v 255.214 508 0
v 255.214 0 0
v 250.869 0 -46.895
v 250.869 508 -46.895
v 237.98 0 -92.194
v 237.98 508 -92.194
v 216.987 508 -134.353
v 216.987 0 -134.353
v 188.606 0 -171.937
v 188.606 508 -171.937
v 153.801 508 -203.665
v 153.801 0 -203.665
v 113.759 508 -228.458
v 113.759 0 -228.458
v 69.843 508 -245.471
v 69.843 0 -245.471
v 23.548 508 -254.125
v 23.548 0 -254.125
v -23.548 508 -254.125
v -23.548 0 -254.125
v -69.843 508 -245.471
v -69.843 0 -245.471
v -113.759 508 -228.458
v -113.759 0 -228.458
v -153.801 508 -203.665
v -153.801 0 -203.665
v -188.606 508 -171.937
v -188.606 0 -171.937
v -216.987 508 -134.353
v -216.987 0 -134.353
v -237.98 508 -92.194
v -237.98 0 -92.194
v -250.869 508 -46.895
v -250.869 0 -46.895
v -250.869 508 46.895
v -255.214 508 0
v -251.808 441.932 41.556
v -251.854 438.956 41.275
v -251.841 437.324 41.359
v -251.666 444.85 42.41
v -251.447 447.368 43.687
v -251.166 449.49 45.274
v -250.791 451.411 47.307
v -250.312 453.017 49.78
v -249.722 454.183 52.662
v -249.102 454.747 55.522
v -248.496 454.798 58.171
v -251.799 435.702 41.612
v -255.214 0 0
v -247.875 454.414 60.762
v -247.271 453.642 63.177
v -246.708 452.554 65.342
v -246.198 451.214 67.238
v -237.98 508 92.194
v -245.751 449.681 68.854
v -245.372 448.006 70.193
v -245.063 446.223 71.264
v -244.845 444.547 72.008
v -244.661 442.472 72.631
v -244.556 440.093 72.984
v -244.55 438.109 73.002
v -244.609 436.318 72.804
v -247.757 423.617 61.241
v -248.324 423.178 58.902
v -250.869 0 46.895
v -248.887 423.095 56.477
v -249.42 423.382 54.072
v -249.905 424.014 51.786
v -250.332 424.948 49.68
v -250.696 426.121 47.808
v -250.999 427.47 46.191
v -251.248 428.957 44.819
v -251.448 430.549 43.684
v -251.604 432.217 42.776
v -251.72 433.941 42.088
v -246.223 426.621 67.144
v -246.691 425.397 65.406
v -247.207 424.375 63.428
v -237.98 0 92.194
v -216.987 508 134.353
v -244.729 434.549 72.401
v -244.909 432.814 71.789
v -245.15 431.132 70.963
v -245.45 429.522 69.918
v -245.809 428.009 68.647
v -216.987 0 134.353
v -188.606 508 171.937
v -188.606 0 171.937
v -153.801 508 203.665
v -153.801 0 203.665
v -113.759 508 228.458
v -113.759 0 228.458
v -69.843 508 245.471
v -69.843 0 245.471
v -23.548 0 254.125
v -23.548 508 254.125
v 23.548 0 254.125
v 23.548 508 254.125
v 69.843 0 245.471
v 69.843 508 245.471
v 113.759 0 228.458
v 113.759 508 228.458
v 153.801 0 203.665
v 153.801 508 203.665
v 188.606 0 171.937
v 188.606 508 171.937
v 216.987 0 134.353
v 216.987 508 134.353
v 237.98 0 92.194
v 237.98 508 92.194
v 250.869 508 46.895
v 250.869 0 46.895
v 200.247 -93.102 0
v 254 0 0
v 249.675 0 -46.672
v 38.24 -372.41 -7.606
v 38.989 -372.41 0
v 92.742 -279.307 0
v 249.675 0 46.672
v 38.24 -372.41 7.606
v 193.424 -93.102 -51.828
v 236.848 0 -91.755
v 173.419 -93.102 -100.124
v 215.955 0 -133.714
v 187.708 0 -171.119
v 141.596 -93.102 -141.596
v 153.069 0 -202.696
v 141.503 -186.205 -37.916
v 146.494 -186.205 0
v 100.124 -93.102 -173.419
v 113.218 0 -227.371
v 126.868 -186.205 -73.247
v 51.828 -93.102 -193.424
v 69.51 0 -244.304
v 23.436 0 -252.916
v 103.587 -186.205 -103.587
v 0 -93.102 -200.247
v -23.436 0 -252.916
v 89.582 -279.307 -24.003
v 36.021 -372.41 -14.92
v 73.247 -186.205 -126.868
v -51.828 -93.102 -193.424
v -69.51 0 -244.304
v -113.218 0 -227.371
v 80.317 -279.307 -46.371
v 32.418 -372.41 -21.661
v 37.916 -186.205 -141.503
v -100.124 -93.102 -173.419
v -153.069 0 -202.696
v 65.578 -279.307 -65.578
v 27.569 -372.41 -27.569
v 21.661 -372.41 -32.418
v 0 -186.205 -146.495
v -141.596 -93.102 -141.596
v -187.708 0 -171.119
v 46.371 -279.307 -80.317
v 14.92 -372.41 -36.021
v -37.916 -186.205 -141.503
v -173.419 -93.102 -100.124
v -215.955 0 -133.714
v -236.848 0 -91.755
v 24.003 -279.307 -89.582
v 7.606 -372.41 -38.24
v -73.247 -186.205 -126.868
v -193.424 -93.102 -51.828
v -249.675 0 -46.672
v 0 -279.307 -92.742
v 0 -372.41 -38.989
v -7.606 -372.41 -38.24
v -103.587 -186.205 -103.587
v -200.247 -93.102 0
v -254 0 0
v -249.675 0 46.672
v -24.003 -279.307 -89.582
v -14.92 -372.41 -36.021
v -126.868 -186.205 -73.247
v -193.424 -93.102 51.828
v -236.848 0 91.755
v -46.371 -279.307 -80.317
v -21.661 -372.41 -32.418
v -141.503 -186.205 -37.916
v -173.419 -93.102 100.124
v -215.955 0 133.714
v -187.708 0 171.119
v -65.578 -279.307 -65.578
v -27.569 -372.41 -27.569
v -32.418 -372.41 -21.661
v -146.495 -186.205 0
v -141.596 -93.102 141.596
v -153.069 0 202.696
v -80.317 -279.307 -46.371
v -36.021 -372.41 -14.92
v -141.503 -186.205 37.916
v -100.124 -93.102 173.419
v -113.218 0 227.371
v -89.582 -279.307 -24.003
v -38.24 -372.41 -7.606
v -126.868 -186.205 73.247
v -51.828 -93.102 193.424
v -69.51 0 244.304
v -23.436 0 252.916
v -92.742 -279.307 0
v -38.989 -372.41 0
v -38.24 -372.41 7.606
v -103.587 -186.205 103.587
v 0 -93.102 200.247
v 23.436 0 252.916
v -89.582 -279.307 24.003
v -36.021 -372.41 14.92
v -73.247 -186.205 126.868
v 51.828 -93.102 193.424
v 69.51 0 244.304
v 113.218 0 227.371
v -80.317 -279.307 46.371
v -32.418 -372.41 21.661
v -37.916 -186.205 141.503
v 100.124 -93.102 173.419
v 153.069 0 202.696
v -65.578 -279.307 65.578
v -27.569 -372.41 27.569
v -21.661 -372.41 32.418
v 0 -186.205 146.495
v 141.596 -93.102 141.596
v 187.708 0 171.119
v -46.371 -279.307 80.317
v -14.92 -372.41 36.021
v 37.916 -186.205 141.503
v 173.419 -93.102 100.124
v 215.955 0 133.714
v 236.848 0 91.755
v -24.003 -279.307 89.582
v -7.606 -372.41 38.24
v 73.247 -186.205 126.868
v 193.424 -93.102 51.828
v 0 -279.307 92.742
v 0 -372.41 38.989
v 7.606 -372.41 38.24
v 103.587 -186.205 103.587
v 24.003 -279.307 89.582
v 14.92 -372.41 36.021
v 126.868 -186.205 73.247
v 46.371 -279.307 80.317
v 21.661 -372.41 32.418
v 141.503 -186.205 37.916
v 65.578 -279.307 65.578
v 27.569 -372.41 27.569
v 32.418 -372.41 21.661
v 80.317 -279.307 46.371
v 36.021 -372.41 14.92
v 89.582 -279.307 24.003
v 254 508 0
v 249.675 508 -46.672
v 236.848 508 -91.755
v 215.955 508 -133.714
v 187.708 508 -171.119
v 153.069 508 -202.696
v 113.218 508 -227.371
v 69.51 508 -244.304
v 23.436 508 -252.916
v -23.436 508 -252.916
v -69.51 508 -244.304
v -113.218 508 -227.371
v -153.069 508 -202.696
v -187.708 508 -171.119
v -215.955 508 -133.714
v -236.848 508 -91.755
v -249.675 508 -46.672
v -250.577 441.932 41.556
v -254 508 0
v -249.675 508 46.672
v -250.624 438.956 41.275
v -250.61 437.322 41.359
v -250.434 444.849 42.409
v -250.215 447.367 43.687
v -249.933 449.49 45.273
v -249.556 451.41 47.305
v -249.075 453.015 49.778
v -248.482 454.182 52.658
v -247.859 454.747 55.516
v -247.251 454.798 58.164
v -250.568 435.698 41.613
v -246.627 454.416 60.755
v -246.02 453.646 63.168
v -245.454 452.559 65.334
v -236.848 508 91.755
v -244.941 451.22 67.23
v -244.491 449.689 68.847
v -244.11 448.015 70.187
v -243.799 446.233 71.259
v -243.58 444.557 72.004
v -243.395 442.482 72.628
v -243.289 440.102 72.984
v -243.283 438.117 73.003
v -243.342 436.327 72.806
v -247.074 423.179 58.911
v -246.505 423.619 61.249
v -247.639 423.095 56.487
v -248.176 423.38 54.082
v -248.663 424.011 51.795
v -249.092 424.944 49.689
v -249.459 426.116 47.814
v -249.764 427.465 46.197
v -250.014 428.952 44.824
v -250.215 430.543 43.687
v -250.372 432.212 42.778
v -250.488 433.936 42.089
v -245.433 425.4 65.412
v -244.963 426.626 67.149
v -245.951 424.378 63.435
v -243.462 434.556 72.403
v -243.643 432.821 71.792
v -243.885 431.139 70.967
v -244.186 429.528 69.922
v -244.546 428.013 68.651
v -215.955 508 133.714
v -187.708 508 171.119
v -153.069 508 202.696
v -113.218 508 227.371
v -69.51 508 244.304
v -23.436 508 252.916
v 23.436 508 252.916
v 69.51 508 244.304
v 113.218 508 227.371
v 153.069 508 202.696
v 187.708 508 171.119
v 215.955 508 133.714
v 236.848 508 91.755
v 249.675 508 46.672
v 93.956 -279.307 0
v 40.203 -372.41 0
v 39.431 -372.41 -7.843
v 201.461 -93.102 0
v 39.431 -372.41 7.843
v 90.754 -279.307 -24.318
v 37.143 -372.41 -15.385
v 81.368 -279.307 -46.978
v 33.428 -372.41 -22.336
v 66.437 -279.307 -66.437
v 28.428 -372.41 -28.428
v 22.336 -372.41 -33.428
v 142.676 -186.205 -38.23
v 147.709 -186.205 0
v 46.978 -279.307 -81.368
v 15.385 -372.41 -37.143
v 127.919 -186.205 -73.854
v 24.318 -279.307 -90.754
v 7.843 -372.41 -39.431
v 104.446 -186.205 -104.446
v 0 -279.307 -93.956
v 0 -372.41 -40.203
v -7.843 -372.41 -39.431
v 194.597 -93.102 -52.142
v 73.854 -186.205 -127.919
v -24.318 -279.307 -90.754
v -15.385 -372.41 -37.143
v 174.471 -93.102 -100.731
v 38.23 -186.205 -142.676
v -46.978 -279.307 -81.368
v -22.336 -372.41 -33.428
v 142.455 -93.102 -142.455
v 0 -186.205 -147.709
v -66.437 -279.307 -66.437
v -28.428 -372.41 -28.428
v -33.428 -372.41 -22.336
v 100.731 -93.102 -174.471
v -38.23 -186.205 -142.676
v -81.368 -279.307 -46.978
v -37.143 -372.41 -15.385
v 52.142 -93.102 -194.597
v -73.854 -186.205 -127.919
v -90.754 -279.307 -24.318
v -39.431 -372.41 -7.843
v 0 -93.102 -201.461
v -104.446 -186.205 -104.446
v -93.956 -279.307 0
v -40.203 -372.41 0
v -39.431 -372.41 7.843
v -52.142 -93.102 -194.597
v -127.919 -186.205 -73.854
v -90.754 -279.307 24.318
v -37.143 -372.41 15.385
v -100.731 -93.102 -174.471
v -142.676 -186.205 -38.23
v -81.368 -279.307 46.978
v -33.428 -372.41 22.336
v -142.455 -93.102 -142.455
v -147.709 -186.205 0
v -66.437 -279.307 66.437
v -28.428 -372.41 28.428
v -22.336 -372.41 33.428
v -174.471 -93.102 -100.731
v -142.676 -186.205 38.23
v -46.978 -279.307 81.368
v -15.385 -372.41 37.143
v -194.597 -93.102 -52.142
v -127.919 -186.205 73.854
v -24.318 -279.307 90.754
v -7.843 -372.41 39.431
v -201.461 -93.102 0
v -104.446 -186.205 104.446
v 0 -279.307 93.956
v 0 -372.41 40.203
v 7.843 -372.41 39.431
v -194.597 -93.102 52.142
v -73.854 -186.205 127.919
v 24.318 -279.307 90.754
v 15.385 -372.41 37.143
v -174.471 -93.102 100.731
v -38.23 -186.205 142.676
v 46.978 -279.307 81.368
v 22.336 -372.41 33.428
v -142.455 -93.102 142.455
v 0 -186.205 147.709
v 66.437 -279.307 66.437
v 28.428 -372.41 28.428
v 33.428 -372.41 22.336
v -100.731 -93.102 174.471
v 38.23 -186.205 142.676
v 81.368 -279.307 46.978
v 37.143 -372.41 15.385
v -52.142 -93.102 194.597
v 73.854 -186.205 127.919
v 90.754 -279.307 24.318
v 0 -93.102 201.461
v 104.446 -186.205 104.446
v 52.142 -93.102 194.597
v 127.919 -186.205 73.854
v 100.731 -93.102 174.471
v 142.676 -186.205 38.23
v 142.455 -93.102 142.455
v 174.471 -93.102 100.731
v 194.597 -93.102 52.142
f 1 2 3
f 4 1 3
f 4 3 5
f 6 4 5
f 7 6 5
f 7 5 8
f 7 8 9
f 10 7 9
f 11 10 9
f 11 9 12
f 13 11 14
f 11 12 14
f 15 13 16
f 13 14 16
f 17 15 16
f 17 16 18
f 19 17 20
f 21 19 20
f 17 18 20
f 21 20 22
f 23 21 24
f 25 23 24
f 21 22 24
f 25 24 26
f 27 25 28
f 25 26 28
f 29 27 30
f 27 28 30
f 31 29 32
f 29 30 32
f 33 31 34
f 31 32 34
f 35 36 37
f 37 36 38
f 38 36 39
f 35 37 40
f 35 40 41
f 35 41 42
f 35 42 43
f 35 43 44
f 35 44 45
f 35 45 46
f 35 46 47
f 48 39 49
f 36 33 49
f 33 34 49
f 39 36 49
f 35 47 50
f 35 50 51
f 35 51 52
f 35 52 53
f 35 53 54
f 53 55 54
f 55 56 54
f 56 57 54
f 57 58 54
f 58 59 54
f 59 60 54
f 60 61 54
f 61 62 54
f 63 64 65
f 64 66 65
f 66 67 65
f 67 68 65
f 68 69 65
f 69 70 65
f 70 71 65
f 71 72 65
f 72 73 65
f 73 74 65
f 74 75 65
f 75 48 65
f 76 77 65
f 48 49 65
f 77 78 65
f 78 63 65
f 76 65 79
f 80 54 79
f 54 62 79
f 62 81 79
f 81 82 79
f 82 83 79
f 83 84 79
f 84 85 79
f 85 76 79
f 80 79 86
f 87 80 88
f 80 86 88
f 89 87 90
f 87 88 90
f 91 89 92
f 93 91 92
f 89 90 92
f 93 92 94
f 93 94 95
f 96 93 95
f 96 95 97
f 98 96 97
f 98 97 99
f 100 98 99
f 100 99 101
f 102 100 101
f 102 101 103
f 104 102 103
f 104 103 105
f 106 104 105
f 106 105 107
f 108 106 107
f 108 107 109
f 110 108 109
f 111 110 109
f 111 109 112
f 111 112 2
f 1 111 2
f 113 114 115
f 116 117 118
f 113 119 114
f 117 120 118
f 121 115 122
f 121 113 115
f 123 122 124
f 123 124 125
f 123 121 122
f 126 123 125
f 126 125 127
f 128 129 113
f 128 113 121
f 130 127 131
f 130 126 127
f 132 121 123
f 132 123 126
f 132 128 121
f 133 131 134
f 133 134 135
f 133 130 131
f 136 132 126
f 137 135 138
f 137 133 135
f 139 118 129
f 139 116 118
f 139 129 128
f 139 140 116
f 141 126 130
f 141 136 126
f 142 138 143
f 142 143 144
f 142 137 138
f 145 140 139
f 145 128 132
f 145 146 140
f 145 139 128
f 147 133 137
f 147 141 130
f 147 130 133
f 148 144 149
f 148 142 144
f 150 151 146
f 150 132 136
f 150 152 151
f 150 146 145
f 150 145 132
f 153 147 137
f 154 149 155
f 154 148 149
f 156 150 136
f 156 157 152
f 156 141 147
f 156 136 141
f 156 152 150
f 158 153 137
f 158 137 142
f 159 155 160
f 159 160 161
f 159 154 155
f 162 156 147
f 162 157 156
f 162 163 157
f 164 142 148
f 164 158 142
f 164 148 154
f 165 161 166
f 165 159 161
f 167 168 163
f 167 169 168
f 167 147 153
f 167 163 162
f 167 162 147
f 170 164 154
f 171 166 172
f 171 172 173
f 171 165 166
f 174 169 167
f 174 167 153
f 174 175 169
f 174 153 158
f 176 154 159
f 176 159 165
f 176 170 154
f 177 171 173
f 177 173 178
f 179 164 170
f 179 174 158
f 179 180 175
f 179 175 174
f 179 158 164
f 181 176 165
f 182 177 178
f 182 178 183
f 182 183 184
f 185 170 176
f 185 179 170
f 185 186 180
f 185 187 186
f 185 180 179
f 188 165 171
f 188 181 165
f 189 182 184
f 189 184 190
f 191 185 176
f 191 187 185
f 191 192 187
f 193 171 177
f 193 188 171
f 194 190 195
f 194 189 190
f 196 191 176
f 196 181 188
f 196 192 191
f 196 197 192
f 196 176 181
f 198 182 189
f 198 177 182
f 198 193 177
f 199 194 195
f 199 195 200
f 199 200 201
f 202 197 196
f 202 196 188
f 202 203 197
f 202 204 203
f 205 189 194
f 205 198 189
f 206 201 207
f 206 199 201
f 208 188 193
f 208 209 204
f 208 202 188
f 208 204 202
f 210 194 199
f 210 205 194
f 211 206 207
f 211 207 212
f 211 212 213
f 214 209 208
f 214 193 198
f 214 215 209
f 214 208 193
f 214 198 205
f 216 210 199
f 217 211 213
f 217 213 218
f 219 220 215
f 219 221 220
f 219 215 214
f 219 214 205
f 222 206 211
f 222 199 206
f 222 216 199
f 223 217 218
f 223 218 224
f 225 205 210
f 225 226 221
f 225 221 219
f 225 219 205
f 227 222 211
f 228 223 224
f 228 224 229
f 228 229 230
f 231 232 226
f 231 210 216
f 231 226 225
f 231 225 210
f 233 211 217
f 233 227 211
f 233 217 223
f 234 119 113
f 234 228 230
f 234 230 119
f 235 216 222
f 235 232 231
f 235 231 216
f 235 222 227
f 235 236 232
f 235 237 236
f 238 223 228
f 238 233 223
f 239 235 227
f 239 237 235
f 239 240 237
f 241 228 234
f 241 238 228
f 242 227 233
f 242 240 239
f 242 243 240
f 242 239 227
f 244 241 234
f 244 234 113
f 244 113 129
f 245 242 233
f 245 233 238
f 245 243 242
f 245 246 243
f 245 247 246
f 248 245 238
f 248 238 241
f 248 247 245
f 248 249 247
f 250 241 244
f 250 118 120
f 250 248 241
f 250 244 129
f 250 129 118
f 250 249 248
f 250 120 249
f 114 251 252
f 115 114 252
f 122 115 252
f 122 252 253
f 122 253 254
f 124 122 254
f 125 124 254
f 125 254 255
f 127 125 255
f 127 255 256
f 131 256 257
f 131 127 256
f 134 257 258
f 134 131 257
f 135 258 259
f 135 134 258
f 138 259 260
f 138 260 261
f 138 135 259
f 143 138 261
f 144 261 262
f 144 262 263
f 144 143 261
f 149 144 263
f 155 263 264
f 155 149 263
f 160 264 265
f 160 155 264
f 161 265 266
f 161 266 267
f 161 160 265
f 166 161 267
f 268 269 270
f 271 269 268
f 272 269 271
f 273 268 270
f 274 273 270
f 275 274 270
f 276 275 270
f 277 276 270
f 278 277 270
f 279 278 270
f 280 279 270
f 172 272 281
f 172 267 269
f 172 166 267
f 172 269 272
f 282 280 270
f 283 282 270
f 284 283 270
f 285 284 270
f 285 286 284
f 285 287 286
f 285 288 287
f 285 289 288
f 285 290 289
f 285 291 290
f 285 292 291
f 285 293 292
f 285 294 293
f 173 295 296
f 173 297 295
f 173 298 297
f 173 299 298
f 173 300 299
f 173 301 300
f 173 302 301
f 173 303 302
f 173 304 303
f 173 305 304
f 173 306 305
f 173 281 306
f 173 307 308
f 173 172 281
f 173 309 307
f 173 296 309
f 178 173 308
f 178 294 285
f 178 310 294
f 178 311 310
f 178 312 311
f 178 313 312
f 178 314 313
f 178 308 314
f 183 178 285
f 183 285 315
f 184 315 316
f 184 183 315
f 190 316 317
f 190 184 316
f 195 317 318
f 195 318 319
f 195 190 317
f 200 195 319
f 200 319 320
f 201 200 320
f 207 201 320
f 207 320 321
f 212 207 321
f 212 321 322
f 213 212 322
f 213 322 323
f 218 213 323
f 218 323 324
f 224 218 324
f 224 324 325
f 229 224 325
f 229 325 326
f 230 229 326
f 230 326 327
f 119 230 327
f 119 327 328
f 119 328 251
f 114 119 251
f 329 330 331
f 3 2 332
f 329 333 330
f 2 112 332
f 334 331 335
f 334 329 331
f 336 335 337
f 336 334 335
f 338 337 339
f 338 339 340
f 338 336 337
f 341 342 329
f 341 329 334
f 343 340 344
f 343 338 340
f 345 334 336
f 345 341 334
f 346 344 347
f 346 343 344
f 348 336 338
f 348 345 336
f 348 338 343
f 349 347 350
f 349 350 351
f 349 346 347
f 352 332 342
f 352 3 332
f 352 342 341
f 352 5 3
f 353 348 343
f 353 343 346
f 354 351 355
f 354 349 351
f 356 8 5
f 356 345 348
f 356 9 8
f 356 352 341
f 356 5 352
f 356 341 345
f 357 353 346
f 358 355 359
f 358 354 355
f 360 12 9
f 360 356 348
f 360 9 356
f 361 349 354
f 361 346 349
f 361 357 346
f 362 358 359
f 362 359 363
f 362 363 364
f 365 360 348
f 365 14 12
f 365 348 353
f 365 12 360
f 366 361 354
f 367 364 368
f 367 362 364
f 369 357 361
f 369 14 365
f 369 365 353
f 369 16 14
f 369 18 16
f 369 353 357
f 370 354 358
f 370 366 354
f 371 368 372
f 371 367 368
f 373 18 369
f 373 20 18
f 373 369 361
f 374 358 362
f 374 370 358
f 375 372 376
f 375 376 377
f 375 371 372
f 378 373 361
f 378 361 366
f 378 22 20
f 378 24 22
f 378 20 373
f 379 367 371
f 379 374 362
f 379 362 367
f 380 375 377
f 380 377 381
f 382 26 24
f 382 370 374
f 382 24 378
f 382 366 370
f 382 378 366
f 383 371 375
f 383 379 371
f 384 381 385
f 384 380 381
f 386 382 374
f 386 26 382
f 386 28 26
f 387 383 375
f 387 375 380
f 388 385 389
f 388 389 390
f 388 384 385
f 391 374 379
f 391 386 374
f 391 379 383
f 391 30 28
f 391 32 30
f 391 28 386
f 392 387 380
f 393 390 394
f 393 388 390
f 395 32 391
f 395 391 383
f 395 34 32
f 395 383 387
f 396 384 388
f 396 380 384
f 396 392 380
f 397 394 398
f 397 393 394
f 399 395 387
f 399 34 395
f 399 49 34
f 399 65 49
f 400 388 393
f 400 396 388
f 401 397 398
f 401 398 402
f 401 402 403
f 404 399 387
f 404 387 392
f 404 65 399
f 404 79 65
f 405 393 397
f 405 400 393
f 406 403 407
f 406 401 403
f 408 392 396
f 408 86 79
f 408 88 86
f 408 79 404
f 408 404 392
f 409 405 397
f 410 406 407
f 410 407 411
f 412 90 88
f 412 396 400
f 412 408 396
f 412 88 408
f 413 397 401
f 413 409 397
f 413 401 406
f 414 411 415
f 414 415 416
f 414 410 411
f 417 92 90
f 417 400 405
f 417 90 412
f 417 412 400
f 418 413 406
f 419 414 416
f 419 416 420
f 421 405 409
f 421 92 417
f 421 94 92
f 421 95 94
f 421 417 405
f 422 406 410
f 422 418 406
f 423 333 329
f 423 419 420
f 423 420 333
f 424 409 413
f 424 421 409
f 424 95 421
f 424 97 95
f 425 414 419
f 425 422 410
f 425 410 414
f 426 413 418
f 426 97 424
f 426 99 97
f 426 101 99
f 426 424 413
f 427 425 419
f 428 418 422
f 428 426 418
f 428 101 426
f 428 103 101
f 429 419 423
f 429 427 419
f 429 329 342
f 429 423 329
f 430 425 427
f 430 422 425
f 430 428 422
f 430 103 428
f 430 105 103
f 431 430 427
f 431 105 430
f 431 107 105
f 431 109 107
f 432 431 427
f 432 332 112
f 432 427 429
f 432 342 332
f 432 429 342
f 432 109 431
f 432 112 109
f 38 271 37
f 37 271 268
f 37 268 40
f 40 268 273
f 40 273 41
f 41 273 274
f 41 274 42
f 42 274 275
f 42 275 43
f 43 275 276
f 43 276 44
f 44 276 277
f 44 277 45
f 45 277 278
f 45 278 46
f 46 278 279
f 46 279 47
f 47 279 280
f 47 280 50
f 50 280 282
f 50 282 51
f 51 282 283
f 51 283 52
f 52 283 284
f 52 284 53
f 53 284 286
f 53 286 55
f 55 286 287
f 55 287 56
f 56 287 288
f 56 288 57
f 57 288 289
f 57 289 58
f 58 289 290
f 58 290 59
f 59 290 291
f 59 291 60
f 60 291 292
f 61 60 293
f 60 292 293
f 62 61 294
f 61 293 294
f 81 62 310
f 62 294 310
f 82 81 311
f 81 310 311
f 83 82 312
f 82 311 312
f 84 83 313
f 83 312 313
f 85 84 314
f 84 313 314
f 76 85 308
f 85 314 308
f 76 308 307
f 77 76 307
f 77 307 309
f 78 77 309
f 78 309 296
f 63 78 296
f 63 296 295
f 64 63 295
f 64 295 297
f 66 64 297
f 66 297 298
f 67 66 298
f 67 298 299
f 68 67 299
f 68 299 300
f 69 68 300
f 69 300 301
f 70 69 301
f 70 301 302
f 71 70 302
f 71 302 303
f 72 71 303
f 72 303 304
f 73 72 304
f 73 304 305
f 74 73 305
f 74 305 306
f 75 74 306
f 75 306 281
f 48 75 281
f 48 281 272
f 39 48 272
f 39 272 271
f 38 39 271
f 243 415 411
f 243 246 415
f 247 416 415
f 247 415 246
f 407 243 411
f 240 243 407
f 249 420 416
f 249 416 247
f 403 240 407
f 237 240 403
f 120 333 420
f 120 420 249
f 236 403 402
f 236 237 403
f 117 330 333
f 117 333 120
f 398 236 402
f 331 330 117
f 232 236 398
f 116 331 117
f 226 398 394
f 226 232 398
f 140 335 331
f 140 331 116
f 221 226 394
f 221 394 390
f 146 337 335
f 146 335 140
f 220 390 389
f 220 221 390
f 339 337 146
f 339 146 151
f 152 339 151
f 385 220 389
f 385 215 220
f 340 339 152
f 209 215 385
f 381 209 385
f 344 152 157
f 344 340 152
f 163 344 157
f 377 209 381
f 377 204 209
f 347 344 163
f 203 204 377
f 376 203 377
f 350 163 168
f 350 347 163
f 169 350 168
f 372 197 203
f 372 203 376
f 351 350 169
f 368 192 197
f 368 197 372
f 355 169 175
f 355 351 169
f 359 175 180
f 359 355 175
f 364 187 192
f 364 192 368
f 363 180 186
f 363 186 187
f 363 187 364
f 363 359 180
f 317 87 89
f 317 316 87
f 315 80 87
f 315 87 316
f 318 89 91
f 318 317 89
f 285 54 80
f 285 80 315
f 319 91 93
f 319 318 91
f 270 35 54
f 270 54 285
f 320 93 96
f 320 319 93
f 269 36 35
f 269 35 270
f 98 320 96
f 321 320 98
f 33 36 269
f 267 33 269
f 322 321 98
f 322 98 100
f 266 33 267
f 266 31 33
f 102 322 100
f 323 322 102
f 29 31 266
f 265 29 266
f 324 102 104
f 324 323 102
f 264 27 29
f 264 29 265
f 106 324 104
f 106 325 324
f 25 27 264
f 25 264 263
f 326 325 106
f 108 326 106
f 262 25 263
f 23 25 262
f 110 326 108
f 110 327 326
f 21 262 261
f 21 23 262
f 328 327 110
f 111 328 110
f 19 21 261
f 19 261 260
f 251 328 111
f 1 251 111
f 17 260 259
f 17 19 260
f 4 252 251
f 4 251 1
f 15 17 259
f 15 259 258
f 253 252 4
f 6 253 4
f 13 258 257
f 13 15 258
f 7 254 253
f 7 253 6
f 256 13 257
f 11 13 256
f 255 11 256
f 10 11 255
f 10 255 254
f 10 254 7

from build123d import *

# Parameters (mm, degrees)
SKETCH1_R           = 255.21412
SKETCH1_R_2         = 254
BOSS_EXTRUDE1_DEPTH = 508
SKETCH3_R           = 15.875
CUT_EXTRUDE1_DEPTH  = 304.8


with BuildPart() as part:
    # Sketch1 → Boss-Extrude1 (new body)
    with BuildSketch(Plane(origin=(0, 0, 0), x_dir=(1, 0, 0), z_dir=(0, 1, 0))):
        Circle(SKETCH1_R)
        Circle(SKETCH1_R_2, mode=Mode.SUBTRACT)
    extrude(amount=BOSS_EXTRUDE1_DEPTH)

    # Sketch2 → Revolve1 (revolve)
    with BuildSketch(Plane.XY):
        Polygon((254, 0), (38.989, -372.409976186), (40.20312, -372.409976186), (255.21412, 0), align=None)
    revolve(axis=Axis((0, -439.940905122, 0), (0, 1, 0)))

    # Sketch3 → Cut-Extrude1 (cut)
    with BuildSketch(Plane(origin=(0, 53.975, 0), x_dir=(0, 0, -1), z_dir=(1, 0, 0))):
        with Locations((-57.15, 384.980800527)):
            Circle(SKETCH3_R)
    extrude(amount=-CUT_EXTRUDE1_DEPTH, mode=Mode.SUBTRACT)


solid = part.part
